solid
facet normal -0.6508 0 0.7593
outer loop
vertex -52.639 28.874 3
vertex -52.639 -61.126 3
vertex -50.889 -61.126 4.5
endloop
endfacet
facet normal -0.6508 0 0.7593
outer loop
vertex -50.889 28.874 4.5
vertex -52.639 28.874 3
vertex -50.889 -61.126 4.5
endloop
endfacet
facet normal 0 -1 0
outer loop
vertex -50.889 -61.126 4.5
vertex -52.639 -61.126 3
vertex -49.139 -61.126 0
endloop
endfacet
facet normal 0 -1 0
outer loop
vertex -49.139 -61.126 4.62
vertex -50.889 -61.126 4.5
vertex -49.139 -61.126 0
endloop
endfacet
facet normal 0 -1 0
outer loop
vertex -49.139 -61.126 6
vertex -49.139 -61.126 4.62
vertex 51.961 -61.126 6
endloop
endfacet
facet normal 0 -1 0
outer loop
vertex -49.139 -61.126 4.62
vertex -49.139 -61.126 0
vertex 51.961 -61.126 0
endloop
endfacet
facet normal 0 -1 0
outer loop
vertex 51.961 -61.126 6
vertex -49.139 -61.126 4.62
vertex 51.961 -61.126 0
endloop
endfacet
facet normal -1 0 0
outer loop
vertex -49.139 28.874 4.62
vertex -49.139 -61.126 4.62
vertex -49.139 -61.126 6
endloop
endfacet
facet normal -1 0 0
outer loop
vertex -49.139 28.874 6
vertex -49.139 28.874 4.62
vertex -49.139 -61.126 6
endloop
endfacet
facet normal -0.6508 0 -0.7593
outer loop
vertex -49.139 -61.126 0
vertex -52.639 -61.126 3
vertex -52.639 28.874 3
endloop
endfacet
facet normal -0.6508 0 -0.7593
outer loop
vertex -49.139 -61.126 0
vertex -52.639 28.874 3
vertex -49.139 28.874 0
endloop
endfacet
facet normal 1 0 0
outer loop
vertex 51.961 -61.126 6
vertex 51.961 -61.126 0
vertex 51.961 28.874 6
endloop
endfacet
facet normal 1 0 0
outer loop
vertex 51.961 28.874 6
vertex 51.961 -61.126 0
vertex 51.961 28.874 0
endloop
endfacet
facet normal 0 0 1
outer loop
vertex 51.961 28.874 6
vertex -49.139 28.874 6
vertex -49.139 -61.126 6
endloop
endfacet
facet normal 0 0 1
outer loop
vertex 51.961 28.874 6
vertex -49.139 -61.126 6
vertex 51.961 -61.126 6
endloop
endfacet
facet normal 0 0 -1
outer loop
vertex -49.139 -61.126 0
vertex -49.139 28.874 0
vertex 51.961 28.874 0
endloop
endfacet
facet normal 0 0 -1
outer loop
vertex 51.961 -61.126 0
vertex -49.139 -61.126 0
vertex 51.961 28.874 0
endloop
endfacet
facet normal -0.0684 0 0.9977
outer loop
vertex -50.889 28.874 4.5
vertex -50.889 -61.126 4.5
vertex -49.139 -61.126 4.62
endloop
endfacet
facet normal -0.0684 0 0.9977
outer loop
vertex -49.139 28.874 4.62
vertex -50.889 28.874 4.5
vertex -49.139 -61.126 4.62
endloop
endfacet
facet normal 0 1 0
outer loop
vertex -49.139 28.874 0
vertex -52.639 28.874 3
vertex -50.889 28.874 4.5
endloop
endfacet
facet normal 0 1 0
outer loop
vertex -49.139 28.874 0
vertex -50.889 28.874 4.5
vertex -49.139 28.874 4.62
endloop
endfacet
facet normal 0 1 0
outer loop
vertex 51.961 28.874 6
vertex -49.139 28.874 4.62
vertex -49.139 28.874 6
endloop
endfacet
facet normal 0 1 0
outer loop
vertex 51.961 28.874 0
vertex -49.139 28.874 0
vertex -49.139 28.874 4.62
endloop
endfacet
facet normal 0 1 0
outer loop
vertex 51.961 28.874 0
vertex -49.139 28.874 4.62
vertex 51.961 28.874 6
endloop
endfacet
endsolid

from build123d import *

# Parameters (mm, degrees)
ESQUISSE1_W             = 104.6
ESQUISSE1_H             = 90
BOSS_EXTRU_3_DEPTH      = 6
ENL_V_MAT_EXTRU_1_DEPTH = 91
ENL_V_MAT_EXTRU_2_DEPTH = 91
ENL_V_MAT_EXTRU_4_DEPTH = 90


with BuildPart() as part:
    # Esquisse1 → Boss.-Extru.3 (new body)
    with BuildSketch(Plane.XY):
        with Locations((-0.339287382, -16.126157407)):
            Rectangle(ESQUISSE1_W, ESQUISSE1_H)
    extrude(amount=BOSS_EXTRU_3_DEPTH)

    # Esquisse4 → Enlèv. mat.-Extru.1 (cut)
    with BuildSketch(Plane.XZ.offset(61.126157407)):
        Polygon((-49.138987395, 6), (-52.639287382, 6), (-52.639287382, 3), align=None)
    extrude(amount=-ENL_V_MAT_EXTRU_1_DEPTH, mode=Mode.SUBTRACT)

    # Esquisse5 → Enlèv. mat.-Extru.2 (cut)
    with BuildSketch(Plane.XZ.offset(61.126157407)):
        Polygon((-52.639287382, 3), (-49.139287382, 0), (-52.639287382, 0), align=None)
    extrude(amount=-ENL_V_MAT_EXTRU_2_DEPTH, mode=Mode.SUBTRACT)

    # Esquisse7 → Enlèv. mat.-Extru.4 (cut)
    with BuildSketch(Plane(origin=(0, -61.126157407, 0), x_dir=(-1, 0, 0), z_dir=(0, -1, 0))):
        Polygon((49.138987395, -6), (50.889137389, -4.5), (49.138987395, -4.6198399), align=None)
    extrude(amount=-ENL_V_MAT_EXTRU_4_DEPTH, mode=Mode.SUBTRACT)


solid = part.part
